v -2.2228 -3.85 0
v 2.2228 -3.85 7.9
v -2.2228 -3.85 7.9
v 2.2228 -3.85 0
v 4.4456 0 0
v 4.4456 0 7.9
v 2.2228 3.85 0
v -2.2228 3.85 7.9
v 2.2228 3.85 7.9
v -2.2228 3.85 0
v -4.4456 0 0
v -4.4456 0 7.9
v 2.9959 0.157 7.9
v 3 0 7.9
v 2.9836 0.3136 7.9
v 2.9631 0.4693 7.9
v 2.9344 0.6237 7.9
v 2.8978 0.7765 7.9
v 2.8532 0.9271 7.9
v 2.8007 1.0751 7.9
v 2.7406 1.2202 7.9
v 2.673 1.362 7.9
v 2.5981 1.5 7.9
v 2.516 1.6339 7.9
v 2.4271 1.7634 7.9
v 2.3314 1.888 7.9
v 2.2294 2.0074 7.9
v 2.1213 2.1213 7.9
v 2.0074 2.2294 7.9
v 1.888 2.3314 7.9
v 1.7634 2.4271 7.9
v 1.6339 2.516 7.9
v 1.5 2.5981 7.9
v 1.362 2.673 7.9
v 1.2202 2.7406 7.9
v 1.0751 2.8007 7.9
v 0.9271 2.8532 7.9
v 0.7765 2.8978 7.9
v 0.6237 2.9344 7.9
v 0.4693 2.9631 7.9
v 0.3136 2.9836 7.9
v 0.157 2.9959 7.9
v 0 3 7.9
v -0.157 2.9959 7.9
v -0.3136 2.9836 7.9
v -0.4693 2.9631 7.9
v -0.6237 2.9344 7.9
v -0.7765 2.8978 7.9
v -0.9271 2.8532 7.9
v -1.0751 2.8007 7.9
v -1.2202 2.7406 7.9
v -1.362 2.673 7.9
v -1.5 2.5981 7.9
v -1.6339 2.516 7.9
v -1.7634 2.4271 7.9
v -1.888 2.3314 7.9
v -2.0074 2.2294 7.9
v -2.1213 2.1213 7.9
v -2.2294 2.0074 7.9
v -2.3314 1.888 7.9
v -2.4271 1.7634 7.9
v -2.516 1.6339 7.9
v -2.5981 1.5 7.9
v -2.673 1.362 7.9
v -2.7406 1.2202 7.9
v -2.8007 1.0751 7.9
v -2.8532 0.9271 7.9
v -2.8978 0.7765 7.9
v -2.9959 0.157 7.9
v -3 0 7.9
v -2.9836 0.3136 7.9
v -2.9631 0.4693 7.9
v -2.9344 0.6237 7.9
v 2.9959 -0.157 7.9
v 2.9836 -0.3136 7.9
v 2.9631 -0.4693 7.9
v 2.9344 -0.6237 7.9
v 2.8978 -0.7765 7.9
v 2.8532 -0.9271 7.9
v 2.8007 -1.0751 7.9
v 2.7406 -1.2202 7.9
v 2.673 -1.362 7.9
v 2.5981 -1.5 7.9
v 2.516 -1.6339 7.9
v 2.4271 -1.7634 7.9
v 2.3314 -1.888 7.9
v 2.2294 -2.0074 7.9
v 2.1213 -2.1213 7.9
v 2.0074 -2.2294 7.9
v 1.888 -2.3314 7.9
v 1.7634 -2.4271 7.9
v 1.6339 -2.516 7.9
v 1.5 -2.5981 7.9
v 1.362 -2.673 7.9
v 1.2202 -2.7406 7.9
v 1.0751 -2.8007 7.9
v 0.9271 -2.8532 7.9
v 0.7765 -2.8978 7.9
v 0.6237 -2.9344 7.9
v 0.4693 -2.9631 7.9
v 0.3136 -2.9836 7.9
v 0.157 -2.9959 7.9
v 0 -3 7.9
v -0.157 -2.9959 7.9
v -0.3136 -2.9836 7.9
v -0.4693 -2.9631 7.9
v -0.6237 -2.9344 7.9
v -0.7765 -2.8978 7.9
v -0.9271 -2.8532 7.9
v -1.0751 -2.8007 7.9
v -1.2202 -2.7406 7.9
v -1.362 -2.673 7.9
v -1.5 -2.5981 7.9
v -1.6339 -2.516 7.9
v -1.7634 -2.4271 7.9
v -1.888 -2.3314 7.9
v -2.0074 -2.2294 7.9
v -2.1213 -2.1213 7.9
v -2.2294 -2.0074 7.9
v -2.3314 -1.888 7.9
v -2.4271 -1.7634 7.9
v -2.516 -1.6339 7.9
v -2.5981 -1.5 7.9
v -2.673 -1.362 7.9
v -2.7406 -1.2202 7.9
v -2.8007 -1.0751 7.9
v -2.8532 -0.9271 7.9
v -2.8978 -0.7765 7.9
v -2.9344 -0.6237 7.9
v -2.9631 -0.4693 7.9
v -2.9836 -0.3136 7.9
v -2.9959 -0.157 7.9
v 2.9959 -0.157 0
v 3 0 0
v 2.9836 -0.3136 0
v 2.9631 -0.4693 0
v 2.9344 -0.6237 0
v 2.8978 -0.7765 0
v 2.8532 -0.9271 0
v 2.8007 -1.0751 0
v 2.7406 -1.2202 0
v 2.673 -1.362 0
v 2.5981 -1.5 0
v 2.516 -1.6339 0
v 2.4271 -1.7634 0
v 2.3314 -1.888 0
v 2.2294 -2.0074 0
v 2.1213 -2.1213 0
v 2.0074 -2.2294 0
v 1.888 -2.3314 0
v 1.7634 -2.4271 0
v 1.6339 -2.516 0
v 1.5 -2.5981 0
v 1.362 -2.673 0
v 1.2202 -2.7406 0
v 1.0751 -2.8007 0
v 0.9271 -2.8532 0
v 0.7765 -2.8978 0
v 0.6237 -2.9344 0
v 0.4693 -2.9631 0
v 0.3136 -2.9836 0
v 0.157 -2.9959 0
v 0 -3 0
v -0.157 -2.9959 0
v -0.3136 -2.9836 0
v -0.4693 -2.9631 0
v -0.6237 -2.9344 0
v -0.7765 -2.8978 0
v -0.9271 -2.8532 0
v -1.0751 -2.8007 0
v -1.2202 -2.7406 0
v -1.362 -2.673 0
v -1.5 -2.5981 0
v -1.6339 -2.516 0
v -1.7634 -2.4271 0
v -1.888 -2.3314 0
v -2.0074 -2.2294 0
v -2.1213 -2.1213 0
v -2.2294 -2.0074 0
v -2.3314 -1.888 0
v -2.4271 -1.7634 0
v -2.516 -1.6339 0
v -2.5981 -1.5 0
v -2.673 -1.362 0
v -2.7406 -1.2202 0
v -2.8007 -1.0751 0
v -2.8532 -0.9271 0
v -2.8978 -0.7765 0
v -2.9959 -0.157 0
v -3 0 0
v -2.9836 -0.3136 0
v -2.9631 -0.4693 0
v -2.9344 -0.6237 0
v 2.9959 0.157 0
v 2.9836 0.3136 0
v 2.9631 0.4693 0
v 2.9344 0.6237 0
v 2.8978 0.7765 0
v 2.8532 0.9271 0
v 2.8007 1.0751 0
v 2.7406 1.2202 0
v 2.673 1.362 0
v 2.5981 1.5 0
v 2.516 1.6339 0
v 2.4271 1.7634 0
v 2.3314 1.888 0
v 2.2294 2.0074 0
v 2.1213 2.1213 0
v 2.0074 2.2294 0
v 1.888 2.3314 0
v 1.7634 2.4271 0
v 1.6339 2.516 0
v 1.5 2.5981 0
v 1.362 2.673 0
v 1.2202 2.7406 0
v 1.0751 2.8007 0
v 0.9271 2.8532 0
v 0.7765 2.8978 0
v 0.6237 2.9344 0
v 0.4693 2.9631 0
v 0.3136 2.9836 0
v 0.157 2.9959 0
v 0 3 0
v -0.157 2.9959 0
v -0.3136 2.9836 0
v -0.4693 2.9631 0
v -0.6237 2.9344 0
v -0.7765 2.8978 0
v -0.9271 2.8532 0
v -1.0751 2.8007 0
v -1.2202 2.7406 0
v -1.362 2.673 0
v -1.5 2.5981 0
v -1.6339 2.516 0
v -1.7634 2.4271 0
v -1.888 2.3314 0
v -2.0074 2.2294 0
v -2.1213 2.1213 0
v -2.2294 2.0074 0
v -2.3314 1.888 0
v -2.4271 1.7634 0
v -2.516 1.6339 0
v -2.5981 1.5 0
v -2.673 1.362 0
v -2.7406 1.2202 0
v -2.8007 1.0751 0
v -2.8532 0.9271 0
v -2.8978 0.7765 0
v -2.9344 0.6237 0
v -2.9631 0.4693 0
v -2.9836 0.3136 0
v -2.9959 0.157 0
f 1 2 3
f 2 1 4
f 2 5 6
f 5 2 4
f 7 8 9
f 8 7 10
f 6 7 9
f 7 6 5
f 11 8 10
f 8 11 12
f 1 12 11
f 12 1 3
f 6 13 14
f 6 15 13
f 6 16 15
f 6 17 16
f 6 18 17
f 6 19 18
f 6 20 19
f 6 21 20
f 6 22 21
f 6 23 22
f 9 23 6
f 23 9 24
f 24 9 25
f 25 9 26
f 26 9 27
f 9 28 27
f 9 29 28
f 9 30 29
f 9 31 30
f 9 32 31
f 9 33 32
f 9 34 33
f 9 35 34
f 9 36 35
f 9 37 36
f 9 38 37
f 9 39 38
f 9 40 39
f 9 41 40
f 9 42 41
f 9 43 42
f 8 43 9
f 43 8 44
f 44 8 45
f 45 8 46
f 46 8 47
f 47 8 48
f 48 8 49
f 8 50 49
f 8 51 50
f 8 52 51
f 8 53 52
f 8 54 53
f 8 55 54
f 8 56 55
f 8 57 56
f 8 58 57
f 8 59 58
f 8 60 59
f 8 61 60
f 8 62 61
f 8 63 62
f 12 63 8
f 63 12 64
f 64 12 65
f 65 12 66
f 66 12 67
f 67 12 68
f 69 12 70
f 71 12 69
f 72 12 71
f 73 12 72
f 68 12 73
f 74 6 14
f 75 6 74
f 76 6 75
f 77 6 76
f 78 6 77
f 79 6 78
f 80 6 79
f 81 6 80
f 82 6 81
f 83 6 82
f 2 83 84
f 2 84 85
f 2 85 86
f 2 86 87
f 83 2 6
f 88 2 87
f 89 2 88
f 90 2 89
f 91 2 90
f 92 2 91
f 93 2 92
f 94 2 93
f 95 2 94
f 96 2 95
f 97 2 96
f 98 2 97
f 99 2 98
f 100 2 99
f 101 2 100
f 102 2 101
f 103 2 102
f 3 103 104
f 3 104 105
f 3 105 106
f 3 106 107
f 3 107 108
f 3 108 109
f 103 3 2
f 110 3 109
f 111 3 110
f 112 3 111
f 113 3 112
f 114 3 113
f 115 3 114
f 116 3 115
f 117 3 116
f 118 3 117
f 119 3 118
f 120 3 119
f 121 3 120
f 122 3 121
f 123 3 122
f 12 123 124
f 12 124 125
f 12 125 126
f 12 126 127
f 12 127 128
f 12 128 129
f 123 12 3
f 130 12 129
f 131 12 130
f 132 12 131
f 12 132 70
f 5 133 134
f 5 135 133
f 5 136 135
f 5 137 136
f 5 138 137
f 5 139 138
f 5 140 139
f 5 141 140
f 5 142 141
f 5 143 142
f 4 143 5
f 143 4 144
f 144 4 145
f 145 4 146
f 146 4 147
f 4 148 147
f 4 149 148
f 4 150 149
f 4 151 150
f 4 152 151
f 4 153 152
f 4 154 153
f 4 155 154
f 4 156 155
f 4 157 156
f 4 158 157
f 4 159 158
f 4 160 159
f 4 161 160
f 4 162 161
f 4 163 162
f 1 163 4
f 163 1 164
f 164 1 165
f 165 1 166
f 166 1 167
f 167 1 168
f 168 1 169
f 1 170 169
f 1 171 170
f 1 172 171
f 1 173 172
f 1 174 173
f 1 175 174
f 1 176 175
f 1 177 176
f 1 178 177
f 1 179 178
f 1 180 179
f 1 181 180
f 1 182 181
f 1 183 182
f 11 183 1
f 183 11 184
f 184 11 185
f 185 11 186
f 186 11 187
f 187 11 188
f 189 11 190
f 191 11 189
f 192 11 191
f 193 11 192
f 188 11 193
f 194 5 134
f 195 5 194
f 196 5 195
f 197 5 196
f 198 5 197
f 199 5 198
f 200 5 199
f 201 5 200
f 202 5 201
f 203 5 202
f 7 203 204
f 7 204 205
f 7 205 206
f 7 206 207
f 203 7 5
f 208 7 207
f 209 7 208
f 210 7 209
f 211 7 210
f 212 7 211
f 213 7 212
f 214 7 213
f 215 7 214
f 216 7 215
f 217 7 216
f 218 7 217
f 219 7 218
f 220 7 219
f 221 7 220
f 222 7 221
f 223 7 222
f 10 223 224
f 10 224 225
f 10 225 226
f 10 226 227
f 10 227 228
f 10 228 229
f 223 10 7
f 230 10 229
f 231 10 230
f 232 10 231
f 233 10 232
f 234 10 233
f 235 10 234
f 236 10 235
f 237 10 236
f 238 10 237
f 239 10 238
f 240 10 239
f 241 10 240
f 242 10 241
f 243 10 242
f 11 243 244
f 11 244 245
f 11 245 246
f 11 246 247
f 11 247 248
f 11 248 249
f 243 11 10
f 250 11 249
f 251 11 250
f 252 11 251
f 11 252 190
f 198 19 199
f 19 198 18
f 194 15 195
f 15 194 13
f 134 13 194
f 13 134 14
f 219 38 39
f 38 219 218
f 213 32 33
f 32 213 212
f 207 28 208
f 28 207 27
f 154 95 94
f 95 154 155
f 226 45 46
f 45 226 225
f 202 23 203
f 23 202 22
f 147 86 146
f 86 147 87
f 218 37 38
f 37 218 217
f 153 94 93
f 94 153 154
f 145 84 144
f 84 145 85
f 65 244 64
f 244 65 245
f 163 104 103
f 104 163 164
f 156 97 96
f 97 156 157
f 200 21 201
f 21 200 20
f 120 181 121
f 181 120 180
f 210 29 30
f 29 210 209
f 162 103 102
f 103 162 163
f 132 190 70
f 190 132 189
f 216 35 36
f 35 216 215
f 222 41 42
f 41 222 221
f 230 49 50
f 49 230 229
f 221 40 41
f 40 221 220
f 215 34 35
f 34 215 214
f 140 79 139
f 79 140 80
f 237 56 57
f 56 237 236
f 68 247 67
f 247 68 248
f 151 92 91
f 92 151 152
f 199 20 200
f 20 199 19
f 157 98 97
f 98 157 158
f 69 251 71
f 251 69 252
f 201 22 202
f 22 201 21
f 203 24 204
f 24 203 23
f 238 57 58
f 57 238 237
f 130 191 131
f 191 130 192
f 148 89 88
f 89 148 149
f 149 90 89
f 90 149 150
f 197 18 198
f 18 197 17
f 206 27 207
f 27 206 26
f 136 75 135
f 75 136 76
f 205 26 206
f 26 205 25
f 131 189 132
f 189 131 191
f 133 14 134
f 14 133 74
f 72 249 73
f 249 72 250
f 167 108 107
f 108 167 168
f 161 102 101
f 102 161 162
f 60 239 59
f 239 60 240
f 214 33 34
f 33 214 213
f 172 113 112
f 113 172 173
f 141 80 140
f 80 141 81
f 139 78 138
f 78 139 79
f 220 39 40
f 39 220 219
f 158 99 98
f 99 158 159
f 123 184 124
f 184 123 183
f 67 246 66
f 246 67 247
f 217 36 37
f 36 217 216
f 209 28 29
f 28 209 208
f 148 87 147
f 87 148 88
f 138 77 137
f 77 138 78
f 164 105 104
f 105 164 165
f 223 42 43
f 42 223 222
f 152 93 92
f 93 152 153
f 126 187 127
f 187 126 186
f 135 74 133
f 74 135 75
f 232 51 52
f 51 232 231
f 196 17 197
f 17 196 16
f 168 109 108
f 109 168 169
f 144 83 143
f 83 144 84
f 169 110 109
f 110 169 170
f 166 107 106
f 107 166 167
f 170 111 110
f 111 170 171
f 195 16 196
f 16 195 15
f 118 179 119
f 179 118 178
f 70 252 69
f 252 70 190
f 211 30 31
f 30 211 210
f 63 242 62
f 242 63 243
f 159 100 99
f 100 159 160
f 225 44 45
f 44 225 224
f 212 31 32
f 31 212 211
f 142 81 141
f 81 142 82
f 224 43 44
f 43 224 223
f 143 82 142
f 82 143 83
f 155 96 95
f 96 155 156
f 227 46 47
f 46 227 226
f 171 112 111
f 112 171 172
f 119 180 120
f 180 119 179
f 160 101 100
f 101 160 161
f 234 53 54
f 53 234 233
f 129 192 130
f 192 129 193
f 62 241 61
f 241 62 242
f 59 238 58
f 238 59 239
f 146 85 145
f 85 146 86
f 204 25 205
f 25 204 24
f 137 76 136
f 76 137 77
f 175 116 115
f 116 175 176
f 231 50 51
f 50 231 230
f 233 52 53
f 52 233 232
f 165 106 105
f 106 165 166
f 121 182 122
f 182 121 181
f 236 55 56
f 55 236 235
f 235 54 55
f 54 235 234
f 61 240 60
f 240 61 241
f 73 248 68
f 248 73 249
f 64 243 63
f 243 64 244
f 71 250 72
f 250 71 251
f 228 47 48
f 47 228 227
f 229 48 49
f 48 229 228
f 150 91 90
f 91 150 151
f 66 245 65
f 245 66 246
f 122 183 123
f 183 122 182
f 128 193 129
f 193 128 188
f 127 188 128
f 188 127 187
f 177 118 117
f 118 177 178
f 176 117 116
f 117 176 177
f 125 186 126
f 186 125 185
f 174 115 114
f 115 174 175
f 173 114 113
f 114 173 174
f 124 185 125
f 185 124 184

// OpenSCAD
$fn = 120;

across_flats = 7.7;   // mm
thickness    = 7.9;   // mm
hole_d       = 6.0;   // mm (clearance as specified)

module hex_prism_af(af, h){
    // For a regular hexagon: across_flats = 2 * apothem = sqrt(3) * R
    // where R is circumradius (center to vertex)
    R = af / sqrt(3);
    cylinder(h=h, r=R, $fn=6);
}

difference() {
    hex_prism_af(across_flats, thickness);
    translate([0,0,-0.2])
        cylinder(h=thickness+0.4, d=hole_d, $fn=120);
}
